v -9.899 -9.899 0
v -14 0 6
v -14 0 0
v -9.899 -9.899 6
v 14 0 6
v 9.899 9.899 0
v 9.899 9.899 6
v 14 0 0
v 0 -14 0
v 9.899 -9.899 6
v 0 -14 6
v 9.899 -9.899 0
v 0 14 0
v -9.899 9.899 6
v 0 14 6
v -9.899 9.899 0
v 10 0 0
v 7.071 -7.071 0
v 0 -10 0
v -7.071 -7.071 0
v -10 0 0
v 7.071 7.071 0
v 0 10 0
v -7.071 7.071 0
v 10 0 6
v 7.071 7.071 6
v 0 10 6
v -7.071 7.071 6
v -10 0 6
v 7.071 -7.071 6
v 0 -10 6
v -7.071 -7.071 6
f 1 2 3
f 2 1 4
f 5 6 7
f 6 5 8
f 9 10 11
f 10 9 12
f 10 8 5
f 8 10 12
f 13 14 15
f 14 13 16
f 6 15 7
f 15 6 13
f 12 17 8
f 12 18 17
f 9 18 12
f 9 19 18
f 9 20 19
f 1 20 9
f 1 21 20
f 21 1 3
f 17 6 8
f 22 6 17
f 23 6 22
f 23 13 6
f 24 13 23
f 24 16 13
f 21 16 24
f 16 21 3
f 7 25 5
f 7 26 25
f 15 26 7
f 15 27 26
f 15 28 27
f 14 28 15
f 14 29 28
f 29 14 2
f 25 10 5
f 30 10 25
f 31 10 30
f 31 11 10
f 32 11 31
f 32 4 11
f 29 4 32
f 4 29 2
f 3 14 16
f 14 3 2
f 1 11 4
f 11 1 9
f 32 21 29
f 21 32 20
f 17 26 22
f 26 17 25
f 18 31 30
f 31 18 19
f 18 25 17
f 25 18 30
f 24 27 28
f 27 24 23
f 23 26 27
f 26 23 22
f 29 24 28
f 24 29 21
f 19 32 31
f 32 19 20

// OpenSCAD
$fn = 50;

difference() {
	union() {
		difference() {
			linear_extrude(height = 6) {
				polygon(points = [[14.0, 0.0], [9.899494936611665, 9.899494936611665], [8.572527594031472e-16, 14.0], [-9.899494936611664, 9.899494936611665], [-14.0, 1.7145055188062944e-15], [-9.899494936611667, -9.899494936611664], [-2.5717582782094417e-15, -14.0], [9.899494936611664, -9.899494936611667]]);
			}
			linear_extrude(height = 6) {
				polygon(points = [[10.0, 0.0], [7.0710678118654755, 7.0710678118654755], [6.123233995736766e-16, 10.0], [-7.071067811865475, 7.0710678118654755], [-10.0, 1.2246467991473533e-15], [-7.071067811865477, -7.071067811865475], [-1.8369701987210296e-15, -10.0], [7.071067811865474, -7.071067811865477]]);
			}
		}
	}
	union();
}
